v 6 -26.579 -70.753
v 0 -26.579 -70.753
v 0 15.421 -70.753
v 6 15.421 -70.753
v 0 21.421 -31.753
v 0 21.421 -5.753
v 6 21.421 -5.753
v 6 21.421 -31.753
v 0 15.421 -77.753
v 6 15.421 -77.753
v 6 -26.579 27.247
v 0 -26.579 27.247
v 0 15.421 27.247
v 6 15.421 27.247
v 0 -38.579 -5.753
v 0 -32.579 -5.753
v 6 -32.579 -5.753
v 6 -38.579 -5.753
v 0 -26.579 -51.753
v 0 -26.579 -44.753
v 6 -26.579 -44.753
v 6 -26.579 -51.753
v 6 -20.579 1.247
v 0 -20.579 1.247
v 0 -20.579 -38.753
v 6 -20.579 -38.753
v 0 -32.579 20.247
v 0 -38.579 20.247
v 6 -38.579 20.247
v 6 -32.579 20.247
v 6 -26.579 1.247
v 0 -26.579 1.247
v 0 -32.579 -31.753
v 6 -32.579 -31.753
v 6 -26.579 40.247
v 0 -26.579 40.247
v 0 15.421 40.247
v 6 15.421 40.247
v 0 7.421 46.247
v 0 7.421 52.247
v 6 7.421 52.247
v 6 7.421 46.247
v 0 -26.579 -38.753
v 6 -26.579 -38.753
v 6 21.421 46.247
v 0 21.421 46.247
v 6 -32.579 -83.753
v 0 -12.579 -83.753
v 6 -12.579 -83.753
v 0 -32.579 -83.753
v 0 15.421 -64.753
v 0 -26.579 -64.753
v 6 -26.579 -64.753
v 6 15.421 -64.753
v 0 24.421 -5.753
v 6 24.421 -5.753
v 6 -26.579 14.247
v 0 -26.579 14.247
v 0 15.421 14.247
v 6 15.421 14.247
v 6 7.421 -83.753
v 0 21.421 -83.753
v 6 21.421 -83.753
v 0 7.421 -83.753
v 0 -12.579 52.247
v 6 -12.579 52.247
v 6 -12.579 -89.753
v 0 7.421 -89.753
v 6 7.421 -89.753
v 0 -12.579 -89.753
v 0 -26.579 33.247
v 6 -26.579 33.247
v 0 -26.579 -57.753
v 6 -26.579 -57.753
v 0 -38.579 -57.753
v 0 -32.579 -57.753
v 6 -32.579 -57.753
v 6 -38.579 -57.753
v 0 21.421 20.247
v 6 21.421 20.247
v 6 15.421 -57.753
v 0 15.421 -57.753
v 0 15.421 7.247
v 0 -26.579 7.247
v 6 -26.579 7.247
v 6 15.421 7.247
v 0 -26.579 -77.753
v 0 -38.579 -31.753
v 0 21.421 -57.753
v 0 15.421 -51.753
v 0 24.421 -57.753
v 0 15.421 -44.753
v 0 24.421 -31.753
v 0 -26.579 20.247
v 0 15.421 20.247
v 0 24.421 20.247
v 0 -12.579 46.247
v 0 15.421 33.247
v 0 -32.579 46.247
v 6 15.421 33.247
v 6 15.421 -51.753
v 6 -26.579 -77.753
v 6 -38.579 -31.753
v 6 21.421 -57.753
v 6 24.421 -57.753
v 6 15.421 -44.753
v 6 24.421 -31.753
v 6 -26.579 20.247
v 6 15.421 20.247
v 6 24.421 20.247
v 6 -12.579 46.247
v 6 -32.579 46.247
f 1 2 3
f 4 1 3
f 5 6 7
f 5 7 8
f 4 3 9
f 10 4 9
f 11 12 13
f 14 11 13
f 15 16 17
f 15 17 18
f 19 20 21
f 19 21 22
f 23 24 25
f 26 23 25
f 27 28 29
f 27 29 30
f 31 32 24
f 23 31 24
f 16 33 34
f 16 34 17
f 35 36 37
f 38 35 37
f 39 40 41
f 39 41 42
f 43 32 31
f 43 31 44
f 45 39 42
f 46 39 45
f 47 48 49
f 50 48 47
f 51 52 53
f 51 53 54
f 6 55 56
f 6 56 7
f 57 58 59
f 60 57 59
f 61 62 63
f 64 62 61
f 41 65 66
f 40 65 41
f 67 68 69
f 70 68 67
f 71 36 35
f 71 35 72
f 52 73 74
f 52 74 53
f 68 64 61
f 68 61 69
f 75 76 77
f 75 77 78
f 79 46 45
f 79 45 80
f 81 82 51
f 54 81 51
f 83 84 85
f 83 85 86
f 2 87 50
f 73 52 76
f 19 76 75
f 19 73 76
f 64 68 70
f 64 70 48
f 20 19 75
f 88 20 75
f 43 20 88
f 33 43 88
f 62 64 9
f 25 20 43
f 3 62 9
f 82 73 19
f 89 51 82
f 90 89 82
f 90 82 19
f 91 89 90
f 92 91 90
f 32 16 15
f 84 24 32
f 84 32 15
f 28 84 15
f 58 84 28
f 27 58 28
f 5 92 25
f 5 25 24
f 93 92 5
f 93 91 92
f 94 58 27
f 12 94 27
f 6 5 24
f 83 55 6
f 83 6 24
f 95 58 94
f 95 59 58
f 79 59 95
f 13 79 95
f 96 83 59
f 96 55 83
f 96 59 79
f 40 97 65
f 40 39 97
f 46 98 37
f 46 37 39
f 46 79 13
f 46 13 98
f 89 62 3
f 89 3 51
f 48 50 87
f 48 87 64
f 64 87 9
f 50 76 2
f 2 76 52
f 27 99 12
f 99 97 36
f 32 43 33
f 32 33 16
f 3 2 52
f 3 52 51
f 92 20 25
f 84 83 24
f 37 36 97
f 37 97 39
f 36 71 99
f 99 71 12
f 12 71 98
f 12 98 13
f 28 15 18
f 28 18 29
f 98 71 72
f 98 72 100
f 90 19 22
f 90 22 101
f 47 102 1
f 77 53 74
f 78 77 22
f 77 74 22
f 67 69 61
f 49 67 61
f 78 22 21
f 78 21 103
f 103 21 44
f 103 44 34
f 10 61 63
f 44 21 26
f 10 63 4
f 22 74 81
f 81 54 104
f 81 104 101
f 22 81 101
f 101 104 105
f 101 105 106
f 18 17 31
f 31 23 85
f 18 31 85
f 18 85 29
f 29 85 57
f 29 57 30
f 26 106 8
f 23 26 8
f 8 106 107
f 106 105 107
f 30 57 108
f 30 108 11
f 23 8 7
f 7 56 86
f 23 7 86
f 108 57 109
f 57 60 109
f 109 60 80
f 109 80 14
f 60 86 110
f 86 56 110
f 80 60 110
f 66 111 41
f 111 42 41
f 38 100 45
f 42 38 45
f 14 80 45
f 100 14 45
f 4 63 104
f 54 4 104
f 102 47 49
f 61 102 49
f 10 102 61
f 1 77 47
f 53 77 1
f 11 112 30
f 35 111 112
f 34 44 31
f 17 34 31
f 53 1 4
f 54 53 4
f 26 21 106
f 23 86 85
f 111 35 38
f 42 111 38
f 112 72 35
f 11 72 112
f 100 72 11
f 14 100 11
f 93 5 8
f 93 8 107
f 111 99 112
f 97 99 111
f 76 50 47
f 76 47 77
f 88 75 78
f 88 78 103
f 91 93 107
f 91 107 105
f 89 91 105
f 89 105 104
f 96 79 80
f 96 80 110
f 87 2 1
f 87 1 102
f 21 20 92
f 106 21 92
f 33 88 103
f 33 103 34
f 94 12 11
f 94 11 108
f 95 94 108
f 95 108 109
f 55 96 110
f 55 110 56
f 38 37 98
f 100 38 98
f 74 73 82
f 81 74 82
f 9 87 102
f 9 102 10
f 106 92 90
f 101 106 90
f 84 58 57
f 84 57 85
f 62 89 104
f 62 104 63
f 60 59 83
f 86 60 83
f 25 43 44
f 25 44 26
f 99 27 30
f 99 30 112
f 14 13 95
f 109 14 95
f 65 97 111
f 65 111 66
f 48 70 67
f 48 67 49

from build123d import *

# Parameters (mm, degrees)
SKETCH1_W           = 7
SKETCH1_H           = 42
SKETCH1_W_2         = 40
SKETCH1_H_2         = 6
BOSS_EXTRUDE1_DEPTH = 6


with BuildPart() as part:
    # Sketch1 → Boss-Extrude1 (new body)
    with BuildSketch(Plane(origin=(0, 0, 0), x_dir=(0, 0, -1), z_dir=(1, 0, 0))):
        Polygon((-46.246943765, 21.420537897), (-20.246943765, 21.420537897), (-20.246943765, 24.420537897), (5.753056235, 24.420537897), (5.753056235, 21.420537897), (31.753056235, 21.420537897), (31.753056235, 24.420537897), (57.753056235, 24.420537897), (57.753056235, 21.420537897), (83.753056235, 21.420537897), (83.753056235, 7.420537897), (89.753056235, 7.420537897), (89.753056235, -12.579462103), (83.753056235, -12.579462103), (83.753056235, -32.579462103), (57.753056235, -32.579462103), (57.753056235, -38.579462103), (31.753056235, -38.579462103), (31.753056235, -32.579462103), (5.753056235, -32.579462103), (5.753056235, -38.579462103), (-20.246943765, -38.579462103), (-20.246943765, -32.579462103), (-46.246943765, -32.579462103), (-46.246943765, -12.579462103), (-52.246943765, -12.579462103), (-52.246943765, 7.420537897), (-46.246943765, 7.420537897), align=None)
        with Locations((-36.746943765, -5.579462103)):
            Rectangle(SKETCH1_W, SKETCH1_H, mode=Mode.SUBTRACT)
        with Locations((48.253056235, -5.579462103)):
            Rectangle(SKETCH1_W, SKETCH1_H, mode=Mode.SUBTRACT)
        with Locations((-23.746943765, -5.579462103)):
            Rectangle(SKETCH1_W, SKETCH1_H, mode=Mode.SUBTRACT)
        with Locations((-10.746943765, -5.579462103)):
            Rectangle(SKETCH1_W, SKETCH1_H, mode=Mode.SUBTRACT)
        with Locations((18.753056235, -23.579462103)):
            Rectangle(SKETCH1_W_2, SKETCH1_H_2, mode=Mode.SUBTRACT)
        with Locations((61.253056235, -5.579462103)):
            Rectangle(SKETCH1_W, SKETCH1_H, mode=Mode.SUBTRACT)
        with Locations((74.253056235, -5.579462103)):
            Rectangle(SKETCH1_W, SKETCH1_H, mode=Mode.SUBTRACT)
    extrude(amount=BOSS_EXTRUDE1_DEPTH)


solid = part.part
